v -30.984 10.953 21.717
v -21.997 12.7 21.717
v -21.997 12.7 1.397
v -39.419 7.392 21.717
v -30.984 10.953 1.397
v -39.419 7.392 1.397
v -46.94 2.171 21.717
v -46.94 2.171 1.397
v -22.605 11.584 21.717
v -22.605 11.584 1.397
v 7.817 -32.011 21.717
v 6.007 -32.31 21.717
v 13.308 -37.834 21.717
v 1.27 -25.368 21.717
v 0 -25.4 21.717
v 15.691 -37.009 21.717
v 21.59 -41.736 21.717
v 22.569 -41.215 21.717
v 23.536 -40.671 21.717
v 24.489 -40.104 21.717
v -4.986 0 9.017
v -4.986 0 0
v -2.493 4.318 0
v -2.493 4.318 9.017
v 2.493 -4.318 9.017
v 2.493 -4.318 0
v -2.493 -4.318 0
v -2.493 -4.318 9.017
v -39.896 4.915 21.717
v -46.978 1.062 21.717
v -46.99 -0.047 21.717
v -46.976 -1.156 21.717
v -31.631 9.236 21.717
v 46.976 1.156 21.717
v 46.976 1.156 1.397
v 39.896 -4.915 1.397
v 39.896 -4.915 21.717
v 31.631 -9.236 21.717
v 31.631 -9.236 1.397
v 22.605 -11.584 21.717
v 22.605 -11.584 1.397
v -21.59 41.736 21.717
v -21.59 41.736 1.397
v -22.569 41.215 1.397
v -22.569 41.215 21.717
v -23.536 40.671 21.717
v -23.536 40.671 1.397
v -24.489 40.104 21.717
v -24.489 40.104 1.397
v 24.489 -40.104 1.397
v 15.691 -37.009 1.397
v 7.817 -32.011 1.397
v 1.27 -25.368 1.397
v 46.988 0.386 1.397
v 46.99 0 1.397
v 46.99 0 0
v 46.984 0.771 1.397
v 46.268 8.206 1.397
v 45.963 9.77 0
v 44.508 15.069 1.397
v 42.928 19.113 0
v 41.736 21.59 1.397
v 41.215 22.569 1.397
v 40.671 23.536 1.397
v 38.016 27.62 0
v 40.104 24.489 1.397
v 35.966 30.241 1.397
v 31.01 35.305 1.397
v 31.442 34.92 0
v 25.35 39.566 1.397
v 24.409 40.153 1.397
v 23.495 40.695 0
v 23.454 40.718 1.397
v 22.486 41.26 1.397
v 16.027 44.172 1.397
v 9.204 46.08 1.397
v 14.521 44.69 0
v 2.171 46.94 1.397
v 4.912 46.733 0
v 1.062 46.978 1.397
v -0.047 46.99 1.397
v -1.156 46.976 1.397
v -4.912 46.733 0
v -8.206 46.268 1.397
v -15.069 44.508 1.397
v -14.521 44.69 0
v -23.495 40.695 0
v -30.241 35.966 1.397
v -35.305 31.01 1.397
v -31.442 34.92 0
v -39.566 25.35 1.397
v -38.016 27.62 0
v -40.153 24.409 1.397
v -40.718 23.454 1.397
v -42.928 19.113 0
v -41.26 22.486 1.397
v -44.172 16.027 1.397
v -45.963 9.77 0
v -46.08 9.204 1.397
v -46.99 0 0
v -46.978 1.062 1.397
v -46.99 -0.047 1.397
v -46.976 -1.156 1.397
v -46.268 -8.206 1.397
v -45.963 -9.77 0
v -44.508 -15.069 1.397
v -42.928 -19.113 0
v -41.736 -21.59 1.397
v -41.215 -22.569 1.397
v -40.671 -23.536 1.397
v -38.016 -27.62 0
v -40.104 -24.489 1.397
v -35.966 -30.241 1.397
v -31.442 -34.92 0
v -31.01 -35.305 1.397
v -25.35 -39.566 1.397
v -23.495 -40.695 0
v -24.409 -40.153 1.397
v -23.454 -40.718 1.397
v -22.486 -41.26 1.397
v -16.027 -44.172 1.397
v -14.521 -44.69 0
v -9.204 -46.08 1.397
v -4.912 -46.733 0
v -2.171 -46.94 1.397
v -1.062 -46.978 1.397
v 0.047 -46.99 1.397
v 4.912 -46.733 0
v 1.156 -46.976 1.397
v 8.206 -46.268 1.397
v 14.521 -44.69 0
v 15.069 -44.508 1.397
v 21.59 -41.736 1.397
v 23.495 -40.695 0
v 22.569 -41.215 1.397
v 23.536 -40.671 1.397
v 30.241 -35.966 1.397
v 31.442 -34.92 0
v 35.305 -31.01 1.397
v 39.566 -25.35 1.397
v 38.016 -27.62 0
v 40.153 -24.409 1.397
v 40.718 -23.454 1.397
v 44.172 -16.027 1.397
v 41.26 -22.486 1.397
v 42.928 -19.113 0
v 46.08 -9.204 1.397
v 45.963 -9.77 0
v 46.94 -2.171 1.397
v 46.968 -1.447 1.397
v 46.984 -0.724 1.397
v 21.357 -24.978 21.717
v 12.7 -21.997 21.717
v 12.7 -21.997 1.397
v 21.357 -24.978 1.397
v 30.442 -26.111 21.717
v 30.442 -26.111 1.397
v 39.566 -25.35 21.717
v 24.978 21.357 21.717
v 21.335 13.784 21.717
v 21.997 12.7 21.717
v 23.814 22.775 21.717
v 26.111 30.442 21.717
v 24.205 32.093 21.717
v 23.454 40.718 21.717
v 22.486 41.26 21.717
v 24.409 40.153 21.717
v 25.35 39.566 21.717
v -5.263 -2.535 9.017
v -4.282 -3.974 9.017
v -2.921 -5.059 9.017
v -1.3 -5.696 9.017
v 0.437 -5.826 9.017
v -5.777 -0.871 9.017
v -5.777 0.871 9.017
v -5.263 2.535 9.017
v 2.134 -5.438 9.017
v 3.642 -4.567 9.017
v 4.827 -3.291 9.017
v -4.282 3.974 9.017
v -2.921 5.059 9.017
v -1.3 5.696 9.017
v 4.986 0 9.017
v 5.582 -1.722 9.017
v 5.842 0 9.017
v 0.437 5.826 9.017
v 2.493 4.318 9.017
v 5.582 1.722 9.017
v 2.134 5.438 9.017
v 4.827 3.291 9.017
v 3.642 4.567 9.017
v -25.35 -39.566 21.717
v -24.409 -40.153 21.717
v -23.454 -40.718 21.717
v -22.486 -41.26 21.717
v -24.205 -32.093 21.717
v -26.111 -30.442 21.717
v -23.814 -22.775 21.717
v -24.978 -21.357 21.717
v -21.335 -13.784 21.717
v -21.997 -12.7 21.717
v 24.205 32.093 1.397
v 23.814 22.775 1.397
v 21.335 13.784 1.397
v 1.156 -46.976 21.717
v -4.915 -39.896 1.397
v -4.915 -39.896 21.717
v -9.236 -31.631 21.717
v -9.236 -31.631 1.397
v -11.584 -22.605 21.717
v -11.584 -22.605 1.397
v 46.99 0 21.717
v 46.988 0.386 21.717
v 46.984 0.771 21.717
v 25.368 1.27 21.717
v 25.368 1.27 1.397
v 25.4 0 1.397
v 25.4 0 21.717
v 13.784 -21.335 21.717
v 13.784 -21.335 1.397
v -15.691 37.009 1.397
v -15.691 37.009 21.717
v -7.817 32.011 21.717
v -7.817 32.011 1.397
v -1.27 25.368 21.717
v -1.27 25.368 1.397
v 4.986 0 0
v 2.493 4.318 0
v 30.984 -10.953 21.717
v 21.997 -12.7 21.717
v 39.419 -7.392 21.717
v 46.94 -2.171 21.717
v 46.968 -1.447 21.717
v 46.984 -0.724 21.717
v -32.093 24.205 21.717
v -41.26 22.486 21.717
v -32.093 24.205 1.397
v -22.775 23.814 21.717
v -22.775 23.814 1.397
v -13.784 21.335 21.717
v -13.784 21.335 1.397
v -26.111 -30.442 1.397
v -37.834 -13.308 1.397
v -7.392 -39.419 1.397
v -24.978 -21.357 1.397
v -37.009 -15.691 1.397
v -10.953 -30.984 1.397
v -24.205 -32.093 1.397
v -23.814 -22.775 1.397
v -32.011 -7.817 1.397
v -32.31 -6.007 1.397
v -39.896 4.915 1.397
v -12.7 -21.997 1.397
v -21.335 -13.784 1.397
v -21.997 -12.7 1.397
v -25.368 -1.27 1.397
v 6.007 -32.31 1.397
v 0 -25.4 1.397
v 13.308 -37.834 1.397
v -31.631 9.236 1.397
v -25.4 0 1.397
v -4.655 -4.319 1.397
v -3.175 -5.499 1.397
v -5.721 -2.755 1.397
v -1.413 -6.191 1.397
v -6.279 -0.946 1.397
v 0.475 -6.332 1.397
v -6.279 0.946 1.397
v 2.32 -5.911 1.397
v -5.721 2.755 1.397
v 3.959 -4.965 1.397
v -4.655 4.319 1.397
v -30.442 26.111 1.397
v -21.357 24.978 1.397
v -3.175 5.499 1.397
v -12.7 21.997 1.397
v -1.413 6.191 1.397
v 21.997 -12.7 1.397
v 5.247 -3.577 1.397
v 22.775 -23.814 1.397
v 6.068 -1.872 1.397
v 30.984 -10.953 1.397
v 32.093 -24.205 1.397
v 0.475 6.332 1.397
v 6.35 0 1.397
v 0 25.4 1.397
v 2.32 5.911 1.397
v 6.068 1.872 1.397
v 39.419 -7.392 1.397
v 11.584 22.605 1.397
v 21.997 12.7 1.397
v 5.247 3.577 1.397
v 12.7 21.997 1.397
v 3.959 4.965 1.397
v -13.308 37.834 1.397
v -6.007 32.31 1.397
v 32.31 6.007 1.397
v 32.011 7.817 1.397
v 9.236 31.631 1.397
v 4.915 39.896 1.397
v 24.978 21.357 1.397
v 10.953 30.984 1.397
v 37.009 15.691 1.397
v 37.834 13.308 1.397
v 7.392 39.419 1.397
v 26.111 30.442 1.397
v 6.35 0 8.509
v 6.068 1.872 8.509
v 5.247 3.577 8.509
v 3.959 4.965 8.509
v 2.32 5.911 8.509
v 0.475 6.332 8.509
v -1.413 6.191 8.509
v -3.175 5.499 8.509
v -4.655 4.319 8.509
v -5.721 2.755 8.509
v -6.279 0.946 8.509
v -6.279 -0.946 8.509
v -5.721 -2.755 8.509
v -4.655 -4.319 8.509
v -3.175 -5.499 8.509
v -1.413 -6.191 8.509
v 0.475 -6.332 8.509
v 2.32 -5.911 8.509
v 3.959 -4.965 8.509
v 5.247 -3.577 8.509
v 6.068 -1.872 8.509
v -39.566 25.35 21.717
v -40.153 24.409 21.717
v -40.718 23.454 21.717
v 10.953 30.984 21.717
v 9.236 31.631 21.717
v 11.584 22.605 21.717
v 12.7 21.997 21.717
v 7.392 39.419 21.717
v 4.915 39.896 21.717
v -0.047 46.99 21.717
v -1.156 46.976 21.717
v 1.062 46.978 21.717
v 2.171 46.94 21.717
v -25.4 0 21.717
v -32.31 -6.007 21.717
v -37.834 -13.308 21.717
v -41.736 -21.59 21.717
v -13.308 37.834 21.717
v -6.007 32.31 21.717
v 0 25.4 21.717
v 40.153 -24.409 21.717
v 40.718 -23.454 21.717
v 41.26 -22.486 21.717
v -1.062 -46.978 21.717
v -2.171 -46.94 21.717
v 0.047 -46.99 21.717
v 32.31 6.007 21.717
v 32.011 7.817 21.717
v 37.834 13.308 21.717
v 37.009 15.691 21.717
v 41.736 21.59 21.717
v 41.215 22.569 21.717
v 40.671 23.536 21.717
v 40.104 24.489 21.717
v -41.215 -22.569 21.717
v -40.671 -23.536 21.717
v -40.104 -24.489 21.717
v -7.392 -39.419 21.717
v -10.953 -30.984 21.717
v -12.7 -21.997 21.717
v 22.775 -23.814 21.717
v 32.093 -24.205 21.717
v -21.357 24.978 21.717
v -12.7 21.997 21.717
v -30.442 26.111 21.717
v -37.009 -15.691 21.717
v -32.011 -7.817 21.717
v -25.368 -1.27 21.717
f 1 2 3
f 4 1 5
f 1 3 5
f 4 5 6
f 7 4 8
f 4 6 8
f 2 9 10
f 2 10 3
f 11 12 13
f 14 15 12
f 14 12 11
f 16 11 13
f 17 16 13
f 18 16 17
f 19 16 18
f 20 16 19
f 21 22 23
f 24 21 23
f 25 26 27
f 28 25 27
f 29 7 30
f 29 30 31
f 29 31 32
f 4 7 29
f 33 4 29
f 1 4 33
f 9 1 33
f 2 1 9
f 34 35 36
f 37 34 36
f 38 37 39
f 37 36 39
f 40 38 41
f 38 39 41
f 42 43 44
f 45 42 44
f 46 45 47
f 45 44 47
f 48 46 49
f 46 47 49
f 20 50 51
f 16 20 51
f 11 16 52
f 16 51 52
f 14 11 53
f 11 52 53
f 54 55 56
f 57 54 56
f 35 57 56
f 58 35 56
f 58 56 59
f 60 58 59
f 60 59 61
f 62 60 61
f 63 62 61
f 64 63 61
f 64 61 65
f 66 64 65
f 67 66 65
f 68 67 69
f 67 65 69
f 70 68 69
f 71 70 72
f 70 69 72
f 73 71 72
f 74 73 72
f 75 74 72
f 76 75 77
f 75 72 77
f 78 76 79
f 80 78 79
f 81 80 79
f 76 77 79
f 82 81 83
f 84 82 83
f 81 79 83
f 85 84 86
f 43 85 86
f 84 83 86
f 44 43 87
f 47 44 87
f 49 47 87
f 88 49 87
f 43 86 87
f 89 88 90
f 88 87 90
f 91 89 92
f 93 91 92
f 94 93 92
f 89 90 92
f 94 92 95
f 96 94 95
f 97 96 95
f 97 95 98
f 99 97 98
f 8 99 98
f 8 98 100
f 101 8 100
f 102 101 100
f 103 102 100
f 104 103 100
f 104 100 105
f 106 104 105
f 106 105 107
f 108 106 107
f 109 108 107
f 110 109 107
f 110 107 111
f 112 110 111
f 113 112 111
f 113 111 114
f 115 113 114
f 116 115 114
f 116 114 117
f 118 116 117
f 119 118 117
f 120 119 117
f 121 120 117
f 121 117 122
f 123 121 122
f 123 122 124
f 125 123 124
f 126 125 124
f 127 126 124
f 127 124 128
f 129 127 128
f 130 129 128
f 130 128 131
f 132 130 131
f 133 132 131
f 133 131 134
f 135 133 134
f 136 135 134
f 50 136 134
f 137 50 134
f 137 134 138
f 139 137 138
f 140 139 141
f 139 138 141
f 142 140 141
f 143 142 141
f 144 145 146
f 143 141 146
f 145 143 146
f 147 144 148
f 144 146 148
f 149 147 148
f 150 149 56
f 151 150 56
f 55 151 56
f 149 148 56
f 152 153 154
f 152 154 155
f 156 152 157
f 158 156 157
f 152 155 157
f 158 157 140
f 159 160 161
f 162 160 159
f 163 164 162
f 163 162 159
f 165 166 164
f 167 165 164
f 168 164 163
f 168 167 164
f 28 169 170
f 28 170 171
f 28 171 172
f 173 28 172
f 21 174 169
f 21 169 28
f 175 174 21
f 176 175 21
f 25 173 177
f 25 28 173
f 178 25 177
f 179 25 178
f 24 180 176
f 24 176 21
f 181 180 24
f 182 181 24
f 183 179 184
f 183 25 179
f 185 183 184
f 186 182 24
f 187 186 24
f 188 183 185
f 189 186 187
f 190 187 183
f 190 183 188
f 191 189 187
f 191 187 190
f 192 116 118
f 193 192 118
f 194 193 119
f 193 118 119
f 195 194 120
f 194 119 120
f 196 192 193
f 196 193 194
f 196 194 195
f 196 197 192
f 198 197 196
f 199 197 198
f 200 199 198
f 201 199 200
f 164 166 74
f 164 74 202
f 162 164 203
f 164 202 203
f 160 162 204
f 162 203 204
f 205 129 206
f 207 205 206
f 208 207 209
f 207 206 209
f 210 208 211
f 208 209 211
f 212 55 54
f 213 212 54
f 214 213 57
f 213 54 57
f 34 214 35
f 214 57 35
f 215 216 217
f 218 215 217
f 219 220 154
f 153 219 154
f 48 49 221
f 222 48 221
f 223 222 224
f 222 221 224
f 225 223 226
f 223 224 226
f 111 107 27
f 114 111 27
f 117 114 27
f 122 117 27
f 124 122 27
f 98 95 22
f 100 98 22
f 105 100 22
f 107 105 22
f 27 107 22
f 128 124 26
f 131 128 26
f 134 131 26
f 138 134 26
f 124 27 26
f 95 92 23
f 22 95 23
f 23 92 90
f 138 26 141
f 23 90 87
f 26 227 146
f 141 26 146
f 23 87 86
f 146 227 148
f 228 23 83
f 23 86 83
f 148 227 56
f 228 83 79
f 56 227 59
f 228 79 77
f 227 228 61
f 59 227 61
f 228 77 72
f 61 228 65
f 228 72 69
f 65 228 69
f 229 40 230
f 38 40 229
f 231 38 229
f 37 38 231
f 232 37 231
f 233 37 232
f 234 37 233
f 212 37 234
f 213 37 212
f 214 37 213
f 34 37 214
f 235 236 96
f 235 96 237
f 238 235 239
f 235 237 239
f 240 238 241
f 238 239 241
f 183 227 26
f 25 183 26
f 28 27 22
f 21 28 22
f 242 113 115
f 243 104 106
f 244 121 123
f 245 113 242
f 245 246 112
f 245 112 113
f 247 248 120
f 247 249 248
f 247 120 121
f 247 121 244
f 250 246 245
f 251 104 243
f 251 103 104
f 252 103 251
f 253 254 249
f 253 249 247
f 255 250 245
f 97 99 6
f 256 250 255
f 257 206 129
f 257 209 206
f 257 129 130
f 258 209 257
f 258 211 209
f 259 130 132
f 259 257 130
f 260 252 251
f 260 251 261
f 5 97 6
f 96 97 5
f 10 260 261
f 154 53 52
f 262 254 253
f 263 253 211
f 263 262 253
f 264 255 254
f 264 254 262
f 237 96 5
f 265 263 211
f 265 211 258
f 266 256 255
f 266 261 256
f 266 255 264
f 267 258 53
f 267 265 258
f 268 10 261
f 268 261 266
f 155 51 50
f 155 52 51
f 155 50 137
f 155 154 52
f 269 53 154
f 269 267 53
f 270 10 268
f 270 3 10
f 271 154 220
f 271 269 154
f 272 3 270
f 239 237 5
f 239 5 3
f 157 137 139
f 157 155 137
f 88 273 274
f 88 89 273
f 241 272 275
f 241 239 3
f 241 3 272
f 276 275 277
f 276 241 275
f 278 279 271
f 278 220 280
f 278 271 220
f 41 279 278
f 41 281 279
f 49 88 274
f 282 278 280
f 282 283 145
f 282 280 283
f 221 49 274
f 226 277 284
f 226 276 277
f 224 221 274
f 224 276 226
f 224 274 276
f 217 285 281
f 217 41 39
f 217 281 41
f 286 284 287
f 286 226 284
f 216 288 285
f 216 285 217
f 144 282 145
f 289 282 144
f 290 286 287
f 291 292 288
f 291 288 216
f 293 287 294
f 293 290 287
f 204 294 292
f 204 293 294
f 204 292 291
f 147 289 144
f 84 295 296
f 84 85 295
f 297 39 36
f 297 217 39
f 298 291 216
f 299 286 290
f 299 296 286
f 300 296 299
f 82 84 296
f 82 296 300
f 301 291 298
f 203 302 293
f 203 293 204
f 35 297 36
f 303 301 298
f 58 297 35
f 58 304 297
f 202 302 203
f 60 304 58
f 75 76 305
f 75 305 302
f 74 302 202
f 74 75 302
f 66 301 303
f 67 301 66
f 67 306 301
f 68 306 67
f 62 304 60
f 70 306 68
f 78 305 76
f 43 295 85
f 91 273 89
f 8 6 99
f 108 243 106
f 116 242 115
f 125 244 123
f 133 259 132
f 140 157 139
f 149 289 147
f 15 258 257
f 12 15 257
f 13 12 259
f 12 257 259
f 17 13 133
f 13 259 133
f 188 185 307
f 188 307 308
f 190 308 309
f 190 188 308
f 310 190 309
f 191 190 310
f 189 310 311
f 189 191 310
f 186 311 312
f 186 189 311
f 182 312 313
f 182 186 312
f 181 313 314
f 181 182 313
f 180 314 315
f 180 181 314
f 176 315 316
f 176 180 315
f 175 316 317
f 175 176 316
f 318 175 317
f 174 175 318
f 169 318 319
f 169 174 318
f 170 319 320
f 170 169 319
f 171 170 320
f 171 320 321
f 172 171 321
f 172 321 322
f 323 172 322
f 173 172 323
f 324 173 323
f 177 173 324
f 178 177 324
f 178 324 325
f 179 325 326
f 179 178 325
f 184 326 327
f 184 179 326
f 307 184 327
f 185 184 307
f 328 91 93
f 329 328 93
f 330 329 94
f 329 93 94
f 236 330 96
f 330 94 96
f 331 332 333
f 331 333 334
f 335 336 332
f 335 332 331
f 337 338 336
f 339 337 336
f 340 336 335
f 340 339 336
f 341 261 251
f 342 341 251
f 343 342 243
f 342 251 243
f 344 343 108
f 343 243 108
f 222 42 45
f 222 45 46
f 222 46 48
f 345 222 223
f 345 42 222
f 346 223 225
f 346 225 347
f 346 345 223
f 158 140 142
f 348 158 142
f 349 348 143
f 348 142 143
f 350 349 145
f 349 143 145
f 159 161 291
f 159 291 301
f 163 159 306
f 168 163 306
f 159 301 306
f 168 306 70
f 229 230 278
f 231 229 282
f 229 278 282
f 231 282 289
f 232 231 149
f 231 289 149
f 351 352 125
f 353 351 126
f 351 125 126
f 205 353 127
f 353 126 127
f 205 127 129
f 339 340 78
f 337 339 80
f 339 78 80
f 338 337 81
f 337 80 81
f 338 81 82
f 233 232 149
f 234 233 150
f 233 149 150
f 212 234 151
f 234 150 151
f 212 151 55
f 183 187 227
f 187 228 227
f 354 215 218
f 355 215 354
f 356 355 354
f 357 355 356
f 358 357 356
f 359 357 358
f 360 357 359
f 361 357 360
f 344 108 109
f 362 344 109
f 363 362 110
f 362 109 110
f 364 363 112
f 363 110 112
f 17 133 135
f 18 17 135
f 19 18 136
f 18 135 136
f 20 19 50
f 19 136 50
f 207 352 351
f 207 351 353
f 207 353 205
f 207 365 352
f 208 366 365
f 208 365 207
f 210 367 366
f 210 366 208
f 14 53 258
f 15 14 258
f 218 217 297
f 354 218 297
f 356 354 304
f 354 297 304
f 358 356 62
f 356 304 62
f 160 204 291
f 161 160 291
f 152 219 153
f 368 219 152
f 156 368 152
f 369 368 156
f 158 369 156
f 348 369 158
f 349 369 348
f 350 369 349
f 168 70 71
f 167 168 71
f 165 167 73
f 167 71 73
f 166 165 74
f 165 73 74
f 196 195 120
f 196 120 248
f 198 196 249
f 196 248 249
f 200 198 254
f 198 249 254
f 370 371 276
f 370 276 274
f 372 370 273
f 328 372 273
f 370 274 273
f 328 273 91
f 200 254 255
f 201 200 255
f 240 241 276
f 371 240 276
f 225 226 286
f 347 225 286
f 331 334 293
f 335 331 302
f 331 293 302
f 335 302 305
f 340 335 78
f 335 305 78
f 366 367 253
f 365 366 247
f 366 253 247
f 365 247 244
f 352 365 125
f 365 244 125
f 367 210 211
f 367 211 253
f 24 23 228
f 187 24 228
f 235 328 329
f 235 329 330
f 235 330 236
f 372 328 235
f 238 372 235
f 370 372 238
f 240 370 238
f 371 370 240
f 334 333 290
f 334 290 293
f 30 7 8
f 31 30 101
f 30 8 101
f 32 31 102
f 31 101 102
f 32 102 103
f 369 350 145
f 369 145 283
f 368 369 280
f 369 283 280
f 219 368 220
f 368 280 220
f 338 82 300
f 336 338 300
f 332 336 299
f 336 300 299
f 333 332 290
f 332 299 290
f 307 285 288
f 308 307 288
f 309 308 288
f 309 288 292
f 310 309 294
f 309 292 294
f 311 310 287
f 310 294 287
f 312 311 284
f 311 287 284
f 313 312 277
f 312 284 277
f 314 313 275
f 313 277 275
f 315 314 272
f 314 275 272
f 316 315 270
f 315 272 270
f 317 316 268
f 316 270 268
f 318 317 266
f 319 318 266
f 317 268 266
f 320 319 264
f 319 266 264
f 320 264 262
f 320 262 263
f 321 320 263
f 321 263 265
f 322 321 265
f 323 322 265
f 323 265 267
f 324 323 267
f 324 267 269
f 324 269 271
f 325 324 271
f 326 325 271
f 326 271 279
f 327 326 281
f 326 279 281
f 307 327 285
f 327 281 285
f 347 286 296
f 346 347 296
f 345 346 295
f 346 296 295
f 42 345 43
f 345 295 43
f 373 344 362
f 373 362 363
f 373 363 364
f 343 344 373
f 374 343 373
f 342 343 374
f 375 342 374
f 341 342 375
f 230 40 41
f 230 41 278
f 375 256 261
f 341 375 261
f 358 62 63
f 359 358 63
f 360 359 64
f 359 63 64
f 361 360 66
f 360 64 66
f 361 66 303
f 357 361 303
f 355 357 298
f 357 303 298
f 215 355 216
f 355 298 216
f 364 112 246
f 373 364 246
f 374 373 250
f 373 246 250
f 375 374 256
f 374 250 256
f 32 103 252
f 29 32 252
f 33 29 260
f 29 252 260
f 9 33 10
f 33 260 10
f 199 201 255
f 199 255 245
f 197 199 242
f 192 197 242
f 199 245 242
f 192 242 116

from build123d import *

# Parameters (mm, degrees)
F0_R     = 46.99
F1_DEPTH = 1.397
F3_DEPTH = 25.4
F4_R     = 6.35
F5_DEPTH = 7.62
F6_SIZE  = 0.508
F8_DEPTH = 20.32


with BuildPart() as f1:
    # F0 (on Top) → F1 (new body)
    with BuildSketch(Plane.XY):
        Circle(F0_R)
    extrude(amount=F1_DEPTH)

    # F2 (on face) → F3 (cut)
    with BuildSketch(Plane(origin=(0, 0, 0), x_dir=(1, 0, 0), z_dir=(0, 0, -1))):
        Polygon((2.4929984624, 4.318), (-2.4929984624, 4.318), (-4.9859969247, 0), (-2.4929984624, -4.318), (2.4929984624, -4.318), (4.9859969247, 0), align=None)
    extrude(amount=-F3_DEPTH, mode=Mode.SUBTRACT)

    # F4 (on face) → F5 (join)
    with BuildSketch(Plane.XY.offset(1.397)):
        Circle(F4_R)
        Polygon((2.4929984624, 4.318), (4.9859969247, 0), (2.4929984624, -4.318), (-2.4929984624, -4.318), (-4.9859969247, 0), (-2.4929984624, 4.318), align=None, mode=Mode.SUBTRACT)
    extrude(amount=F5_DEPTH)

    # F6
    f6_edges = [f1.edges().sort_by_distance(p)[0] for p in [
        (-6.35, 0, 9.017),
    ]]
    chamfer(f6_edges, length=F6_SIZE)

    # F7 (on face) → F8 (join)
    with BuildSketch(Plane.XY.offset(1.397)):
        with BuildLine():
            ThreePointArc((25.4, 0), (35.2612826312, 9.5139210825), (41.7364588819, 21.59))
            ThreePointArc((41.7364588819, 21.59), (40.9458823261, 23.0541714346), (40.1039614528, 24.4894339623))
            ThreePointArc((40.1039614528, 24.4894339623), (34.7338091215, 11.6119097242), (25.3682301314, 1.27))
            Line((25.3682301314, 1.27), (25.4, 0))
        make_face()
        with BuildLine():
            ThreePointArc((21.9970452561, 12.7), (25.7802059874, 25.8699386627), (25.3498336557, 39.5657179087))
            ThreePointArc((25.3498336557, 39.5657179087), (23.9330885575, 40.4384392886), (22.4863324294, 41.260452662))
            ThreePointArc((22.4863324294, 41.260452662), (24.2744062074, 27.4231133684), (21.3345317428, 13.7839673285))
            Line((21.3345317428, 13.7839673285), (21.9970452561, 12.7))
        make_face()
        with BuildLine():
            ThreePointArc((12.7, 21.9970452561), (9.3913439685, 35.2941270699), (2.1707409732, 46.9398336557))
            ThreePointArc((2.1707409732, 46.9398336557), (0.5074430375, 46.9872599921), (-1.1564912092, 46.9757663917))
            ThreePointArc((-1.1564912092, 46.9757663917), (7.3106957532, 35.8863159315), (11.5842628029, 22.6045317428))
            Line((11.5842628029, 22.6045317428), (12.7, 21.9970452561))
        make_face()
        with BuildLine():
            ThreePointArc((0, 25.4), (-9.5139210825, 35.2612826312), (-21.59, 41.7364588819))
            ThreePointArc((-21.59, 41.7364588819), (-23.0541714346, 40.9458823261), (-24.4894339623, 40.1039614528))
            ThreePointArc((-24.4894339623, 40.1039614528), (-11.6119097242, 34.7338091215), (-1.27, 25.3682301314))
            Line((-1.27, 25.3682301314), (0, 25.4))
        make_face()
        with BuildLine():
            ThreePointArc((-12.7, 21.9970452561), (-25.8699386627, 25.7802059874), (-39.5657179087, 25.3498336557))
            ThreePointArc((-39.5657179087, 25.3498336557), (-40.4384392886, 23.9330885575), (-41.260452662, 22.4863324294))
            ThreePointArc((-41.260452662, 22.4863324294), (-27.4231133684, 24.2744062074), (-13.7839673285, 21.3345317428))
            Line((-13.7839673285, 21.3345317428), (-12.7, 21.9970452561))
        make_face()
        with BuildLine():
            ThreePointArc((-21.9970452561, 12.7), (-35.2941270699, 9.3913439685), (-46.9398336557, 2.1707409732))
            ThreePointArc((-46.9398336557, 2.1707409732), (-46.9872599921, 0.5074430375), (-46.9757663917, -1.1564912092))
            ThreePointArc((-46.9757663917, -1.1564912092), (-35.8863159315, 7.3106957532), (-22.6045317428, 11.5842628029))
            Line((-22.6045317428, 11.5842628029), (-21.9970452561, 12.7))
        make_face()
        with BuildLine():
            ThreePointArc((-41.7364588819, -21.59), (-40.9458823261, -23.0541714346), (-40.1039614528, -24.4894339623))
            ThreePointArc((-40.1039614528, -24.4894339623), (-34.7338091215, -11.6119097242), (-25.3682301314, -1.27))
            Line((-25.3682301314, -1.27), (-25.4, 0))
            ThreePointArc((-25.4, 0), (-35.2612826312, -9.5139210825), (-41.7364588819, -21.59))
        make_face()
        with BuildLine():
            ThreePointArc((-25.3498336557, -39.5657179087), (-23.9330885575, -40.4384392886), (-22.4863324294, -41.260452662))
            ThreePointArc((-22.4863324294, -41.260452662), (-24.2744062074, -27.4231133684), (-21.3345317428, -13.7839673285))
            Line((-21.3345317428, -13.7839673285), (-21.9970452561, -12.7))
            ThreePointArc((-21.9970452561, -12.7), (-25.7802059874, -25.8699386627), (-25.3498336557, -39.5657179087))
        make_face()
        with BuildLine():
            ThreePointArc((-2.1707409732, -46.9398336557), (-0.5074430375, -46.9872599921), (1.1564912092, -46.9757663917))
            ThreePointArc((1.1564912092, -46.9757663917), (-7.3106957532, -35.8863159315), (-11.5842628029, -22.6045317428))
            Line((-11.5842628029, -22.6045317428), (-12.7, -21.9970452561))
            ThreePointArc((-12.7, -21.9970452561), (-9.3913439685, -35.2941270699), (-2.1707409732, -46.9398336557))
        make_face()
        with BuildLine():
            ThreePointArc((21.59, -41.7364588819), (23.0541714346, -40.9458823261), (24.4894339623, -40.1039614528))
            ThreePointArc((24.4894339623, -40.1039614528), (11.6119097242, -34.7338091215), (1.27, -25.3682301314))
            Line((1.27, -25.3682301314), (0, -25.4))
            ThreePointArc((0, -25.4), (9.5139210825, -35.2612826312), (21.59, -41.7364588819))
        make_face()
        with BuildLine():
            ThreePointArc((39.5657179087, -25.3498336557), (40.4384392886, -23.9330885575), (41.260452662, -22.4863324294))
            ThreePointArc((41.260452662, -22.4863324294), (27.4231133684, -24.2744062074), (13.7839673285, -21.3345317428))
            Line((13.7839673285, -21.3345317428), (12.7, -21.9970452561))
            ThreePointArc((12.7, -21.9970452561), (25.8699386627, -25.7802059874), (39.5657179087, -25.3498336557))
        make_face()
        with BuildLine():
            ThreePointArc((46.99, 0), (46.9864414632, 0.5782893983), (46.9757663917, 1.1564912092))
            ThreePointArc((46.9757663917, 1.1564912092), (35.8863159315, -7.3106957532), (22.6045317428, -11.5842628029))
            Line((22.6045317428, -11.5842628029), (21.9970452561, -12.7))
            ThreePointArc((21.9970452561, -12.7), (35.2941270699, -9.3913439685), (46.9398336557, -2.1707409732))
            ThreePointArc((46.9398336557, -2.1707409732), (46.9774567398, -1.085660287), (46.99, 0))
        make_face()
    extrude(amount=F8_DEPTH)


solid = f1.part
